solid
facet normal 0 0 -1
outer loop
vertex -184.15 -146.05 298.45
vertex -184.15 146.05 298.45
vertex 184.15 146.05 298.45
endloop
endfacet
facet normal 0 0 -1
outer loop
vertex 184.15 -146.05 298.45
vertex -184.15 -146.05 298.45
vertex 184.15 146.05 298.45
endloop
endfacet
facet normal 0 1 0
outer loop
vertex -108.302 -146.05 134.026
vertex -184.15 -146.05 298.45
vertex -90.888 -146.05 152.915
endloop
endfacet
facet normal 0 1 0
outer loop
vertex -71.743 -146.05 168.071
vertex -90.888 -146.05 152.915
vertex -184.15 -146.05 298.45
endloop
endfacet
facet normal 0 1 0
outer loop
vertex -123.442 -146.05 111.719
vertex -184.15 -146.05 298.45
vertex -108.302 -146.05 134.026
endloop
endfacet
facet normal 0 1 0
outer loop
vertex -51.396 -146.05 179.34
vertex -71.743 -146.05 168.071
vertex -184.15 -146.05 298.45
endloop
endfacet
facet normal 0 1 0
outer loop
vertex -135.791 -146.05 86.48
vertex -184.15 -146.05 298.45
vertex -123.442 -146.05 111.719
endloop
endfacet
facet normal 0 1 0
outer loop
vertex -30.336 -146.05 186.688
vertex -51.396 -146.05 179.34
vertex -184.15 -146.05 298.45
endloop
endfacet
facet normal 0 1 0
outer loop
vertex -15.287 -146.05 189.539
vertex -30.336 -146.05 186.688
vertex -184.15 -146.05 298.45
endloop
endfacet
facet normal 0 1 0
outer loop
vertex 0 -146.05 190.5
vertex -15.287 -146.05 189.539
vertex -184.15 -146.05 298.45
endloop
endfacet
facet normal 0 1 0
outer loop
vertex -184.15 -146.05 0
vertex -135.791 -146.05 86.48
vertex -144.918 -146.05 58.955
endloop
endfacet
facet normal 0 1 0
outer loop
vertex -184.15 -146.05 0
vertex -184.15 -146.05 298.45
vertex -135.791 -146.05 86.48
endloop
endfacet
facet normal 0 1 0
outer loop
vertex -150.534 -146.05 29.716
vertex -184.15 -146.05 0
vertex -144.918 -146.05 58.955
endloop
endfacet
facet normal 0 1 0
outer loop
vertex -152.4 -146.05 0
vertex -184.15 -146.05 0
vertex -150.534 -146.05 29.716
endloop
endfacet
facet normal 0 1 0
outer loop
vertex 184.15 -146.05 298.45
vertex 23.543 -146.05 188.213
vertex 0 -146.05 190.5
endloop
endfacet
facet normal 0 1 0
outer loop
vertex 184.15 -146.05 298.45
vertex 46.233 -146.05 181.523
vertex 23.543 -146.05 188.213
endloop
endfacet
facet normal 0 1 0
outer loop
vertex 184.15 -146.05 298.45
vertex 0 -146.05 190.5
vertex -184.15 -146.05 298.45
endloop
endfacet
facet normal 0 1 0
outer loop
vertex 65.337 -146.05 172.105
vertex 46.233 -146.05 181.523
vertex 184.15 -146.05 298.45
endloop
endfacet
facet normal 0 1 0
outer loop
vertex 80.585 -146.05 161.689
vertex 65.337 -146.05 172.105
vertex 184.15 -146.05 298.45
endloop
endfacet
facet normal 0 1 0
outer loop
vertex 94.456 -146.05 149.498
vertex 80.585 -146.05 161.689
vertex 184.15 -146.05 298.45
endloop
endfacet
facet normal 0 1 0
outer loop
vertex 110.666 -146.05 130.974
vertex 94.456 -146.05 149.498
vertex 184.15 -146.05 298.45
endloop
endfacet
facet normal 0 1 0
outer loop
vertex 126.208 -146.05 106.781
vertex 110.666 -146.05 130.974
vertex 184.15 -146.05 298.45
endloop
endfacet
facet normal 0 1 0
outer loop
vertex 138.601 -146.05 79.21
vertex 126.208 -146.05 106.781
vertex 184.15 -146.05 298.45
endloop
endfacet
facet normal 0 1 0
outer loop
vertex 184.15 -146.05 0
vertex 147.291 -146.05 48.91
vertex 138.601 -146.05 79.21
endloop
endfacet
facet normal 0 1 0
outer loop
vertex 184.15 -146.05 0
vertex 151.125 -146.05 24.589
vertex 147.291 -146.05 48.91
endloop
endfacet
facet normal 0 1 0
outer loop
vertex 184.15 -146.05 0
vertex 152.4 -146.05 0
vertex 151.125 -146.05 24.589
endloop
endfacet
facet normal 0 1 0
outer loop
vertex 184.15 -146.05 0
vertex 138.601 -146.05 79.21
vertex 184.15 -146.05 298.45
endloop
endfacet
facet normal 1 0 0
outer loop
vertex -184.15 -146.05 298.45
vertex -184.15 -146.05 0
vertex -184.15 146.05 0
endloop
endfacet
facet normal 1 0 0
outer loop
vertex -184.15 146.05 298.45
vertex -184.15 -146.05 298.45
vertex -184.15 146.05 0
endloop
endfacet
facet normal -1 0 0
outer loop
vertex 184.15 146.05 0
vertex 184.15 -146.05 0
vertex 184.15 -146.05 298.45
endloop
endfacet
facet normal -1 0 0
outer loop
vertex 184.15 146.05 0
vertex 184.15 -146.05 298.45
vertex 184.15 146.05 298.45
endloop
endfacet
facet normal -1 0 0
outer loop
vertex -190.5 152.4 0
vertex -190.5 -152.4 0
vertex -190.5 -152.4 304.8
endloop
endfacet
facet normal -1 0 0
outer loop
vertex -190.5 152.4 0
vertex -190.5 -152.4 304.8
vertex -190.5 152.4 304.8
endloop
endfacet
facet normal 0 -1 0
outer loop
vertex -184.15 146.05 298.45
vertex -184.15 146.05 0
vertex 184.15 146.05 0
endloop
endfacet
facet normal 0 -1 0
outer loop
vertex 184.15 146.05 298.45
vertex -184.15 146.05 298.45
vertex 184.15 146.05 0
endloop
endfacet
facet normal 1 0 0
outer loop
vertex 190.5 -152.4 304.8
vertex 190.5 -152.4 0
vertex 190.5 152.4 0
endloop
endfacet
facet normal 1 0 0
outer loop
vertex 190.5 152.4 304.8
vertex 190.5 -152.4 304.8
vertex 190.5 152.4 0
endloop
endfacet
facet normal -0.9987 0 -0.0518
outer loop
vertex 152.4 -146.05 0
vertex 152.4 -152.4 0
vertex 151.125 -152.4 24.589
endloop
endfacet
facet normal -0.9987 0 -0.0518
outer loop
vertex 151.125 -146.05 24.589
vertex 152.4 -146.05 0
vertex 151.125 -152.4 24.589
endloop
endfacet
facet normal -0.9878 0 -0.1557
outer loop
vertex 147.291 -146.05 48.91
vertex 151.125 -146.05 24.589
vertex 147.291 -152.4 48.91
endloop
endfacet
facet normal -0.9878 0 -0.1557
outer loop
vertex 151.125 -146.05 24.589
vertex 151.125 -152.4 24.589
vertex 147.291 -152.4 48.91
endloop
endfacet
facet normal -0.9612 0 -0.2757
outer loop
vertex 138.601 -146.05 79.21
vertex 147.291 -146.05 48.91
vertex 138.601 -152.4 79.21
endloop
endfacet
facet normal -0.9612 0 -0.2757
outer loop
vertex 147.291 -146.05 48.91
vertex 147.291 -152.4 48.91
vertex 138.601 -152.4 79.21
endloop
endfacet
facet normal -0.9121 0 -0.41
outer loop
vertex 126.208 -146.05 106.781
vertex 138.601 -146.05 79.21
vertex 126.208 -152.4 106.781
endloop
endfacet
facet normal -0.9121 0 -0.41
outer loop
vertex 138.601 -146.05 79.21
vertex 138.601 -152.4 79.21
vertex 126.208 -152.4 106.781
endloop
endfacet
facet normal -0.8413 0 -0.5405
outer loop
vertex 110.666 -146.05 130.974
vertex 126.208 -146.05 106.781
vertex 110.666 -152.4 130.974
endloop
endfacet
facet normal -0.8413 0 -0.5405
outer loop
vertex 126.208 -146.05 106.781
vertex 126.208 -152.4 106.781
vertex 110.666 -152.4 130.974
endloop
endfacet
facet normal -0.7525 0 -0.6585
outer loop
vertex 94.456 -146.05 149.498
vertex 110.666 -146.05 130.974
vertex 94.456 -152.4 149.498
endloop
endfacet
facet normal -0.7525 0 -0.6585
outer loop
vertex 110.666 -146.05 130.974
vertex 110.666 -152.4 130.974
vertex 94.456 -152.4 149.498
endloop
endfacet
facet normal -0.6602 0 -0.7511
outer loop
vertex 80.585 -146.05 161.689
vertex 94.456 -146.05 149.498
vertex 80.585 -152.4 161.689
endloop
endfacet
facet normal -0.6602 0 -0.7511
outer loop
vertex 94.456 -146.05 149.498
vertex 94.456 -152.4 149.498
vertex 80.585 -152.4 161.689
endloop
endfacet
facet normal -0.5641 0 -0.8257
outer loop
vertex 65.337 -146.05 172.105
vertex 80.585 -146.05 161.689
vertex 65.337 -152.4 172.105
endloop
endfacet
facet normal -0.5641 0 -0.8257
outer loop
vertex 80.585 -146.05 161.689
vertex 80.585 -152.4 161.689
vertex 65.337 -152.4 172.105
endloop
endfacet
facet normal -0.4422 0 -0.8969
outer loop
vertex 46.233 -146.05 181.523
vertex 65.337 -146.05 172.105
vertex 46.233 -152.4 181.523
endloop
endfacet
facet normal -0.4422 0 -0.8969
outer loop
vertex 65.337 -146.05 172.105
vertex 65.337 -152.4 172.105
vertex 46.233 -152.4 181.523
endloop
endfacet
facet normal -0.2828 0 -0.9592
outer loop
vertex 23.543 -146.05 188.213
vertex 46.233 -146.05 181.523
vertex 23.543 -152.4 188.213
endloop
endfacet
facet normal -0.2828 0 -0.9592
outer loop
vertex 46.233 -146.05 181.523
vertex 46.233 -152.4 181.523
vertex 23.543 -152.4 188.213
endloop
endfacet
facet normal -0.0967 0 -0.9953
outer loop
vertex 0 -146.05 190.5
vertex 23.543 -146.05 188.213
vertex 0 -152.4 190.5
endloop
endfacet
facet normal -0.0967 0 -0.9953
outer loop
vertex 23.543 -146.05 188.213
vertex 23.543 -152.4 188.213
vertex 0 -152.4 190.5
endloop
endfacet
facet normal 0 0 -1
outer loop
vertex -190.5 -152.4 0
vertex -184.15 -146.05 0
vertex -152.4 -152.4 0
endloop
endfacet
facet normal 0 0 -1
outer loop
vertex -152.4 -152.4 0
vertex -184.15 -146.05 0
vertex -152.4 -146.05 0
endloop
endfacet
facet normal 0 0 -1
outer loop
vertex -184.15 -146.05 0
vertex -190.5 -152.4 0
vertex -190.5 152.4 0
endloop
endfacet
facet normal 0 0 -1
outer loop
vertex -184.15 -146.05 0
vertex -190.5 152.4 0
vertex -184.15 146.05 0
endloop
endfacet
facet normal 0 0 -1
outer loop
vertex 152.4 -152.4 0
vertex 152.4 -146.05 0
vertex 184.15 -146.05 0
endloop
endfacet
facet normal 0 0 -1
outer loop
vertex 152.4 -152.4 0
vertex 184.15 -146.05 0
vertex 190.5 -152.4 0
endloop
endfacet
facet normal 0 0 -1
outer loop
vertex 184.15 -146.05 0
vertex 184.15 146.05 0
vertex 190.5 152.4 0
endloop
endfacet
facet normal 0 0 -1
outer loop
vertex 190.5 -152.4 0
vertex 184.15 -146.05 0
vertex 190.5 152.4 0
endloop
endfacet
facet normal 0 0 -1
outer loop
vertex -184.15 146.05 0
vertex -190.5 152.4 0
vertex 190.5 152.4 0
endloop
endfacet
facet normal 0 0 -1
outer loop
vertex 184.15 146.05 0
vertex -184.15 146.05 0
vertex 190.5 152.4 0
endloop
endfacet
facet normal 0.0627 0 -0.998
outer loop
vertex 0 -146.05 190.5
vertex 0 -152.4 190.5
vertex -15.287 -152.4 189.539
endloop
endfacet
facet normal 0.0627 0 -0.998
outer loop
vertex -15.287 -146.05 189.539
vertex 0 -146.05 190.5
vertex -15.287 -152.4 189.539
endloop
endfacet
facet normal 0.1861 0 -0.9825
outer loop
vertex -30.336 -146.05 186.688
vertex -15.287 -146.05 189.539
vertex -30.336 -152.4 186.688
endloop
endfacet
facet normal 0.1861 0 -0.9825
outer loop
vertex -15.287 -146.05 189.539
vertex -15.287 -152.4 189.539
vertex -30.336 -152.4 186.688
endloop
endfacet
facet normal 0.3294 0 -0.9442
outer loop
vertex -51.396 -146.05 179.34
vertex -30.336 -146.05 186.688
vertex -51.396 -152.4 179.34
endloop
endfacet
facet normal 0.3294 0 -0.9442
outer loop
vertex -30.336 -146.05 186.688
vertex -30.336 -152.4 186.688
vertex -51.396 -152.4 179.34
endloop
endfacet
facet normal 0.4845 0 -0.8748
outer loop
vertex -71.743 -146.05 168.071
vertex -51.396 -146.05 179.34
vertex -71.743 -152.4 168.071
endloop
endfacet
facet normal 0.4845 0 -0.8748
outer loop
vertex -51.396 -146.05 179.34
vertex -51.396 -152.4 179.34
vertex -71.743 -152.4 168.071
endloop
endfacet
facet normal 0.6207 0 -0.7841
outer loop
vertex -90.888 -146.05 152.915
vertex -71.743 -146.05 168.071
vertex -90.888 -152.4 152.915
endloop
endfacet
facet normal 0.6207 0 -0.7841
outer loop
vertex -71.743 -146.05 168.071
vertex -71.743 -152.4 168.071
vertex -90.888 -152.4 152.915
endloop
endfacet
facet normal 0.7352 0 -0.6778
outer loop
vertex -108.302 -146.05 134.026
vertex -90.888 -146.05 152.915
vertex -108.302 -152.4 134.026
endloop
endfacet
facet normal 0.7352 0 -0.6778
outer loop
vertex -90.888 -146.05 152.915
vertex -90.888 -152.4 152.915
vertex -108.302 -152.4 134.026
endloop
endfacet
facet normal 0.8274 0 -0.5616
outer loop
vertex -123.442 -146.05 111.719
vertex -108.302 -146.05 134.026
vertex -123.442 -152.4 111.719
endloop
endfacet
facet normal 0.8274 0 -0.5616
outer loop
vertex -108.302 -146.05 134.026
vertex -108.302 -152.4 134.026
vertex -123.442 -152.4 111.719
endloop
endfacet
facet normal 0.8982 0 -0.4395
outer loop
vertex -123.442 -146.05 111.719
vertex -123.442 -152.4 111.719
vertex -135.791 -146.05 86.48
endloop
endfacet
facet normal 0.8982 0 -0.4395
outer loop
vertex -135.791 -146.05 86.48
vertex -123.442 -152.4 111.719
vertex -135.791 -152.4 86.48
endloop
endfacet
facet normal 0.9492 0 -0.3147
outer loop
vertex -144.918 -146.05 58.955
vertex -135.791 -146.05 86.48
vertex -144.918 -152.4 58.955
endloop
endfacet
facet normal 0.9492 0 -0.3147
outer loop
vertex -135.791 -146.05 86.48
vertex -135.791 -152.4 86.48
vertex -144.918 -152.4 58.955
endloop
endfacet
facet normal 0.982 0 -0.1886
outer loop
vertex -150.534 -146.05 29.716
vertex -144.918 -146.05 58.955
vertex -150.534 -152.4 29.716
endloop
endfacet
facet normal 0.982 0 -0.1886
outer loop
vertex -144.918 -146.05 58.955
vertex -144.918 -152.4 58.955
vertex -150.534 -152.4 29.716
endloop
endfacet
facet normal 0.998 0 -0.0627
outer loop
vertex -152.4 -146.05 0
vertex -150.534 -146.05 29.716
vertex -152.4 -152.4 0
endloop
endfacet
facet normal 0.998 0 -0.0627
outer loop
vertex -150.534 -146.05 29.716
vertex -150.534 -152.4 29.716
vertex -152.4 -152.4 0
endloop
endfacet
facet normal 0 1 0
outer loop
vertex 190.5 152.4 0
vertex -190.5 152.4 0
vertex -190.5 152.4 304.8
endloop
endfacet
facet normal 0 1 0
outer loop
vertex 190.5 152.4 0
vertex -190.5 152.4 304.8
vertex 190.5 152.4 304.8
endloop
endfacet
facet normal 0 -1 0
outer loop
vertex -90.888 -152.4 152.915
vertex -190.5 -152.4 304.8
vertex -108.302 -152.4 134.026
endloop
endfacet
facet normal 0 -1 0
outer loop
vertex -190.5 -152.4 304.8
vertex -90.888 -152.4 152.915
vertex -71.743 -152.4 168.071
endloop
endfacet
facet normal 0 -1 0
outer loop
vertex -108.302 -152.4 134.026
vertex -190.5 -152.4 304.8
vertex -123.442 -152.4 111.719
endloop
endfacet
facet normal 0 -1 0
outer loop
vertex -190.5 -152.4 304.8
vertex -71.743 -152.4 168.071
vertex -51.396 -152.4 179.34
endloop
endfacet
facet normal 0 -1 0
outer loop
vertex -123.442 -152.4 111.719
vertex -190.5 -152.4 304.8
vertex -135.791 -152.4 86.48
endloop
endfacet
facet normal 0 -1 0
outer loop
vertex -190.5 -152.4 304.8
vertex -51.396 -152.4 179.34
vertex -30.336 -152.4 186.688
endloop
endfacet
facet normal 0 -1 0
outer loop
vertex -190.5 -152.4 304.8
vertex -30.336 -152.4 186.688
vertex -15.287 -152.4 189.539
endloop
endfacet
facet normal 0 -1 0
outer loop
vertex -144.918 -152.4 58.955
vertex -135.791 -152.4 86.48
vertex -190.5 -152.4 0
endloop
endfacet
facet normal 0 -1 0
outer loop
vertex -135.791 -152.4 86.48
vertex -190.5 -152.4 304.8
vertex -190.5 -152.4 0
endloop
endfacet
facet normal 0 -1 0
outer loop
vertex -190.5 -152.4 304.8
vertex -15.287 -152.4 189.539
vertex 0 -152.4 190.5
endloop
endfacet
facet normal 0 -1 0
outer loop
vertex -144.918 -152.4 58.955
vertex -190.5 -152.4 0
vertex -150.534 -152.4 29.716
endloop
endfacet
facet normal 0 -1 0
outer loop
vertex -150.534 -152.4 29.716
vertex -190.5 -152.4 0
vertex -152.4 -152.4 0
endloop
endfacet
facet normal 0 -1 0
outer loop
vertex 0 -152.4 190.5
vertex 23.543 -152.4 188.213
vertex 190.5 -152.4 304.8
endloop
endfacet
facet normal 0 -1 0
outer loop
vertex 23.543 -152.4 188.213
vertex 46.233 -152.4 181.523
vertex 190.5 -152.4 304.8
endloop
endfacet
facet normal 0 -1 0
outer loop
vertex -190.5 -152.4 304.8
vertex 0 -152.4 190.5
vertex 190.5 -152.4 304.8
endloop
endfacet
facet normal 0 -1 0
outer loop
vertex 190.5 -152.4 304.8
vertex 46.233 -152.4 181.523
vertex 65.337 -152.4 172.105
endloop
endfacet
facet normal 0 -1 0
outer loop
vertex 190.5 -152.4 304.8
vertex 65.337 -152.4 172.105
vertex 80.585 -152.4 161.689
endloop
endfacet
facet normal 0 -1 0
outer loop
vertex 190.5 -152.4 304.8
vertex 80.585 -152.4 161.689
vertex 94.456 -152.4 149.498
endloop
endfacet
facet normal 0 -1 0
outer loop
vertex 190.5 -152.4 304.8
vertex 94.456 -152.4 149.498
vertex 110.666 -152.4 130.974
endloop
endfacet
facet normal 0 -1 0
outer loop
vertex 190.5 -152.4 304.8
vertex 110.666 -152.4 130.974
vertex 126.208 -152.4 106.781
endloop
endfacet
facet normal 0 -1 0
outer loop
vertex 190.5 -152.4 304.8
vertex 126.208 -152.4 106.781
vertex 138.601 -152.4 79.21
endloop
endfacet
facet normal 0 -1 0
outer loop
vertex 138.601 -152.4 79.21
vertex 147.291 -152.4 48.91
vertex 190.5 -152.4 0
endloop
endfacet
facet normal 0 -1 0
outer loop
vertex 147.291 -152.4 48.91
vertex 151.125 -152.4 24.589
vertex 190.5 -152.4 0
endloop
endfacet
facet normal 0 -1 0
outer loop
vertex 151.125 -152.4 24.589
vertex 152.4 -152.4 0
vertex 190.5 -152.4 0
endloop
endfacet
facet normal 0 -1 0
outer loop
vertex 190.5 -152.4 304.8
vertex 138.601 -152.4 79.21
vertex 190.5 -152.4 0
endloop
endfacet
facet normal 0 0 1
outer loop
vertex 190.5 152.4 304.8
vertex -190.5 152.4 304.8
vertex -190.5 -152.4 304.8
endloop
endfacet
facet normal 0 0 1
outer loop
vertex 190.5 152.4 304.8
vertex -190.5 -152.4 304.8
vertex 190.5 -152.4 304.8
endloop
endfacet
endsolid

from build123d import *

# Parameters (mm, degrees)
F0_W     = 381
F0_H     = 304.8
F1_DEPTH = 304.8
F4_T     = -6.35
F5_DEPTH = 127


with BuildPart() as f1:
    # F0 (on Top) → F1 (new body)
    with BuildSketch(Plane.XY):
        Rectangle(F0_W, F0_H)
    extrude(amount=F1_DEPTH)

    # F4
    f4_openings = [f1.faces().sort_by_distance(p)[0] for p in [
        (0, 0, 0),
    ]]
    offset(amount=F4_T, openings=f4_openings)

    # F3 (on offset) → F5 (cut)
    with BuildSketch(Plane.XZ.offset(254)):
        with BuildLine():
            add(Edge.make_bspline(
                [(0, 190.5), (-263.964543, 190.5), (-131.982272, -95.25), (0, -381), (131.982272, -95.25), (263.964543, 190.5), (0, 190.5)],
                knots=[0, 0, 0, 2.094395, 2.094395, 4.18879, 4.18879, 6.283185, 6.283185, 6.283185], degree=2, weights=[1, 0.5, 1, 0.5, 1, 0.5, 1]))
        make_face()
    extrude(amount=-F5_DEPTH, mode=Mode.SUBTRACT)


solid = f1.part
